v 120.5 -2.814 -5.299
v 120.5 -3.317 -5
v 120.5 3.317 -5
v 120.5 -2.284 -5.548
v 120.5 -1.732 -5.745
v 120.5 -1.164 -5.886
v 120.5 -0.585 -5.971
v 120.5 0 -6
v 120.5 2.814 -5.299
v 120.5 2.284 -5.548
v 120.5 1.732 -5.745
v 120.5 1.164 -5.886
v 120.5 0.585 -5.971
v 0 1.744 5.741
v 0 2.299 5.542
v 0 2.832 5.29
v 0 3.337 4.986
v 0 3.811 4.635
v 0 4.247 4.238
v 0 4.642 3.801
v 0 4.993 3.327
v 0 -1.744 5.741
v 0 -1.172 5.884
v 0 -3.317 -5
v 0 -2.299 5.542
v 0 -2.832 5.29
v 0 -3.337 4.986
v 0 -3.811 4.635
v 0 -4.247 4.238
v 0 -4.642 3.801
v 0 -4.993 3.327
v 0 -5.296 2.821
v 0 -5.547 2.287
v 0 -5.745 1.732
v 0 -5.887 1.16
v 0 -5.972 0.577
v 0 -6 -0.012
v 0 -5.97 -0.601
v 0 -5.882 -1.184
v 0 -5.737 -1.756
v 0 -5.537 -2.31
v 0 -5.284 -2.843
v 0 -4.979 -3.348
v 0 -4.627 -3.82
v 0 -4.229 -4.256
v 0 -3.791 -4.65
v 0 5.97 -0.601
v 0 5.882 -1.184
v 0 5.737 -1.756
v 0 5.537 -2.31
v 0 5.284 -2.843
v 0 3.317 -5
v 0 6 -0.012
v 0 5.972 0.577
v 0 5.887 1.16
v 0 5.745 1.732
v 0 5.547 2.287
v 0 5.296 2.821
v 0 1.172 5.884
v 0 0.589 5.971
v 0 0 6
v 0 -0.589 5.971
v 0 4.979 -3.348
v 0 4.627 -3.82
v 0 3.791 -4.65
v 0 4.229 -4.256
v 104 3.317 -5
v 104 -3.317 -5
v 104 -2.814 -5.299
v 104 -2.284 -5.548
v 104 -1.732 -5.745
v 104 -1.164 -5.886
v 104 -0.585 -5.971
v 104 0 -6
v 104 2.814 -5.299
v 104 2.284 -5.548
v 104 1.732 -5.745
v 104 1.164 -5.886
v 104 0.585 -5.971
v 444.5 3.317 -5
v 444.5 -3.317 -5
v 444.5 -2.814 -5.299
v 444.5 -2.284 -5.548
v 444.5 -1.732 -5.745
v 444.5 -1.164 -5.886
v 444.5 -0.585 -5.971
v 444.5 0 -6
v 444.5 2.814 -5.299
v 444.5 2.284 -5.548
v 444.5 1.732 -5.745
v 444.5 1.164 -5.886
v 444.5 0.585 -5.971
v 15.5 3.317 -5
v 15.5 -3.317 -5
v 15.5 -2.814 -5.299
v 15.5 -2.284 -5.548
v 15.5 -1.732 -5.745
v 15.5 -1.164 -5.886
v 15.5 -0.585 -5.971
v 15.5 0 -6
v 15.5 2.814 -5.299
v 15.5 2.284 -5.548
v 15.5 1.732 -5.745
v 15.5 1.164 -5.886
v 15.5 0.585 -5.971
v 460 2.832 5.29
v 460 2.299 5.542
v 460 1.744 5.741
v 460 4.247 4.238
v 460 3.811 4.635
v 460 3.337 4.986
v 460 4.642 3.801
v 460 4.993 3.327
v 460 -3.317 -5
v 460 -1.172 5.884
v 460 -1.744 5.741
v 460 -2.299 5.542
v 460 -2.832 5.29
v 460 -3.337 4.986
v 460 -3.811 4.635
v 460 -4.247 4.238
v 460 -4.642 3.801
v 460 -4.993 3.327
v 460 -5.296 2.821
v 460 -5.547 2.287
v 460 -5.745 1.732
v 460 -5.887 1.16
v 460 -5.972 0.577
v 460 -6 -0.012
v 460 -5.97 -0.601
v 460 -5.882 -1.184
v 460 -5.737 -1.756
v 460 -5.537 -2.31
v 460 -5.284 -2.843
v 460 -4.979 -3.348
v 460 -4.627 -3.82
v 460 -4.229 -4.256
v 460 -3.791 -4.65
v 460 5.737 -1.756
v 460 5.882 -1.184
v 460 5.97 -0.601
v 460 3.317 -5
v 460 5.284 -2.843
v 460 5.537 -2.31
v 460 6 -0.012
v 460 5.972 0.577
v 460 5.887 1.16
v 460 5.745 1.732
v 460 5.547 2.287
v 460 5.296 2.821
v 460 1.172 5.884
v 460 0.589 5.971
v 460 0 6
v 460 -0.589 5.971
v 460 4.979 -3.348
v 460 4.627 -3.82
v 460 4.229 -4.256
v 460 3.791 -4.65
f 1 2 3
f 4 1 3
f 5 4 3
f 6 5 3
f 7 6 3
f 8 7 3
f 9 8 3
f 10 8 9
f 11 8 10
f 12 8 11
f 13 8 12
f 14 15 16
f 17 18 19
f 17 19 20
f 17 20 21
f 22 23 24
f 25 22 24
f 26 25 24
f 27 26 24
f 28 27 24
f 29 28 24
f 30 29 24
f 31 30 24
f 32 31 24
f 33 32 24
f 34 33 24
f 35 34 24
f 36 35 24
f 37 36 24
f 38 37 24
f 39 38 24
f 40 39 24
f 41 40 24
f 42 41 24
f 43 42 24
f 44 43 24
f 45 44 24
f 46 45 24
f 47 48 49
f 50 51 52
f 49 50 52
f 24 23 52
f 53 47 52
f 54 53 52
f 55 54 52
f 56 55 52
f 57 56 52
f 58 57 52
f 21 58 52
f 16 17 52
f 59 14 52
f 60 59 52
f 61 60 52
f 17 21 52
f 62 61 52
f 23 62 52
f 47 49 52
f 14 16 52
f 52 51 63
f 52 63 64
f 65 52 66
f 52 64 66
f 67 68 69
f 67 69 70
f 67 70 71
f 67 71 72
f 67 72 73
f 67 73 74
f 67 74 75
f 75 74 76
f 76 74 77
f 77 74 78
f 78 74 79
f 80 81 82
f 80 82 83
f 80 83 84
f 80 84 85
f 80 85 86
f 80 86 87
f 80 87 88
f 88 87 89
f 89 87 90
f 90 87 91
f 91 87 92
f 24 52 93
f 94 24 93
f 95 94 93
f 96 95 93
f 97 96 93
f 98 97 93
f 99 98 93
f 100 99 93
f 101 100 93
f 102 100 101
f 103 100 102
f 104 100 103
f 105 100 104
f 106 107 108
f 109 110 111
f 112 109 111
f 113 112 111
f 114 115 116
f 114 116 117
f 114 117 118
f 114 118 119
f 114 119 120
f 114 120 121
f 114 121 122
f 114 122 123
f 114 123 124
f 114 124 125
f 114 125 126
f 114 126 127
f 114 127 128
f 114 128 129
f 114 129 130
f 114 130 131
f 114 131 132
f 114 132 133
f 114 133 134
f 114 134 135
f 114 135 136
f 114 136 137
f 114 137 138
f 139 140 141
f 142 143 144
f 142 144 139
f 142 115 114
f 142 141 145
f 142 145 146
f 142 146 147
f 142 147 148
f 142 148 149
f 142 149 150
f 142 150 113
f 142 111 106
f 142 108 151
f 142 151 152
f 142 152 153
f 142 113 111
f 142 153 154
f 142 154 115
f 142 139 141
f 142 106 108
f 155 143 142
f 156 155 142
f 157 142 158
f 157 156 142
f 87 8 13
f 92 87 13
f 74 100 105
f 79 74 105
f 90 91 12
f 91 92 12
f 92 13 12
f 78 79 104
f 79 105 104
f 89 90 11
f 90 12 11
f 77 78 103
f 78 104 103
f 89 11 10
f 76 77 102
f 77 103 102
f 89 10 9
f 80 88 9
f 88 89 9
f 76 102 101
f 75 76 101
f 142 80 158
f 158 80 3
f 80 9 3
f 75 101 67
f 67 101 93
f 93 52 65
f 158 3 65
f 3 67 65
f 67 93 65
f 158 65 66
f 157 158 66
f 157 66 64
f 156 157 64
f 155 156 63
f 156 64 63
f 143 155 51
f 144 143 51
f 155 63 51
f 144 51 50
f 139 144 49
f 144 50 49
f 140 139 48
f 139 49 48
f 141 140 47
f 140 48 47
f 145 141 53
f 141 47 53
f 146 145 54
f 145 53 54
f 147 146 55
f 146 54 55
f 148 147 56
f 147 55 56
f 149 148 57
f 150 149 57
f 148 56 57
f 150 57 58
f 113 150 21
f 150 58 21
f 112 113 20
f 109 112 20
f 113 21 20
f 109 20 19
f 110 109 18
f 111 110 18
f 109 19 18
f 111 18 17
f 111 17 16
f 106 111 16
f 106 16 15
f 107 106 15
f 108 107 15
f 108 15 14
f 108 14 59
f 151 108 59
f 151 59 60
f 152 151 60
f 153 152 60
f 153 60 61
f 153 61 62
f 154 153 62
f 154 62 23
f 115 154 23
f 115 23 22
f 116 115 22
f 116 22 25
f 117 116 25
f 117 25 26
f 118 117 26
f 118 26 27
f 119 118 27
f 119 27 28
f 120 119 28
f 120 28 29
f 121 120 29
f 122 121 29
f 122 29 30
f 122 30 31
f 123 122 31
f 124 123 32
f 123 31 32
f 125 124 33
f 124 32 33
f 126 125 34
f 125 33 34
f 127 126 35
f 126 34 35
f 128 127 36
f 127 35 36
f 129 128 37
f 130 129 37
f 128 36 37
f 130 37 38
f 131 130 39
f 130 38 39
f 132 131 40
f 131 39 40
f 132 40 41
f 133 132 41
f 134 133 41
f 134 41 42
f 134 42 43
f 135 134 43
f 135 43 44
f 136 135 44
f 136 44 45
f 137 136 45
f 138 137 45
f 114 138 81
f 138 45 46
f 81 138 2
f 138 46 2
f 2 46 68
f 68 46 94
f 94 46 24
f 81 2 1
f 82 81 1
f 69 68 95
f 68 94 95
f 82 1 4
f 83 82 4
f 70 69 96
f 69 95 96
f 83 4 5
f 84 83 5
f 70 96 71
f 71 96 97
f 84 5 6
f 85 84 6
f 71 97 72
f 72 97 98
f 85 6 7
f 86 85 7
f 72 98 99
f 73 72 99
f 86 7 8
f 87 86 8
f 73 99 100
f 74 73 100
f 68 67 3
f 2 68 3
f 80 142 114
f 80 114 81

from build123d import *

# Parameters (mm, degrees)
SKETCH_1_R          = 6
EXTRUDE_1_DEPTH     = 460
SKETCH_2_W          = 15.5
SKETCH_2_H          = 1
CUT_EXTRUDE_1_DEPTH = 200
SKETCH_4_W          = 16.5
SKETCH_4_H          = 1
CUT_EXTRUDE_2_DEPTH = 200


with BuildPart() as part:
    # 草图1 → 凸台-拉伸1 (new body)
    with BuildSketch(Plane(origin=(0, 0, 0), x_dir=(0, 0, -1), z_dir=(1, 0, 0))):
        Circle(SKETCH_1_R)
    extrude(amount=EXTRUDE_1_DEPTH)

    # 草图2 → 切除-拉伸1 (cut, symmetric)
    with BuildSketch(Plane(origin=(0, 0, 0), x_dir=(1, 0, 0), z_dir=(0, 1, 0))):
        with Locations((7.75, 5.5)):
            Rectangle(SKETCH_2_W, SKETCH_2_H)
    cut_extrude_1 = extrude(amount=CUT_EXTRUDE_1_DEPTH, both=True, mode=Mode.SUBTRACT)

    # 镜向1: 切除-拉伸1 across plane
    add(cut_extrude_1.mirror(Plane.ZY.offset(-230)), mode=Mode.SUBTRACT)

    # 草图4 → 切除-拉伸2 (cut, symmetric)
    with BuildSketch(Plane(origin=(0, 0, 0), x_dir=(1, 0, 0), z_dir=(0, 1, 0))):
        with Locations((112.25, 5.5)):
            Rectangle(SKETCH_4_W, SKETCH_4_H)
    extrude(amount=CUT_EXTRUDE_2_DEPTH, both=True, mode=Mode.SUBTRACT)


solid = part.part
